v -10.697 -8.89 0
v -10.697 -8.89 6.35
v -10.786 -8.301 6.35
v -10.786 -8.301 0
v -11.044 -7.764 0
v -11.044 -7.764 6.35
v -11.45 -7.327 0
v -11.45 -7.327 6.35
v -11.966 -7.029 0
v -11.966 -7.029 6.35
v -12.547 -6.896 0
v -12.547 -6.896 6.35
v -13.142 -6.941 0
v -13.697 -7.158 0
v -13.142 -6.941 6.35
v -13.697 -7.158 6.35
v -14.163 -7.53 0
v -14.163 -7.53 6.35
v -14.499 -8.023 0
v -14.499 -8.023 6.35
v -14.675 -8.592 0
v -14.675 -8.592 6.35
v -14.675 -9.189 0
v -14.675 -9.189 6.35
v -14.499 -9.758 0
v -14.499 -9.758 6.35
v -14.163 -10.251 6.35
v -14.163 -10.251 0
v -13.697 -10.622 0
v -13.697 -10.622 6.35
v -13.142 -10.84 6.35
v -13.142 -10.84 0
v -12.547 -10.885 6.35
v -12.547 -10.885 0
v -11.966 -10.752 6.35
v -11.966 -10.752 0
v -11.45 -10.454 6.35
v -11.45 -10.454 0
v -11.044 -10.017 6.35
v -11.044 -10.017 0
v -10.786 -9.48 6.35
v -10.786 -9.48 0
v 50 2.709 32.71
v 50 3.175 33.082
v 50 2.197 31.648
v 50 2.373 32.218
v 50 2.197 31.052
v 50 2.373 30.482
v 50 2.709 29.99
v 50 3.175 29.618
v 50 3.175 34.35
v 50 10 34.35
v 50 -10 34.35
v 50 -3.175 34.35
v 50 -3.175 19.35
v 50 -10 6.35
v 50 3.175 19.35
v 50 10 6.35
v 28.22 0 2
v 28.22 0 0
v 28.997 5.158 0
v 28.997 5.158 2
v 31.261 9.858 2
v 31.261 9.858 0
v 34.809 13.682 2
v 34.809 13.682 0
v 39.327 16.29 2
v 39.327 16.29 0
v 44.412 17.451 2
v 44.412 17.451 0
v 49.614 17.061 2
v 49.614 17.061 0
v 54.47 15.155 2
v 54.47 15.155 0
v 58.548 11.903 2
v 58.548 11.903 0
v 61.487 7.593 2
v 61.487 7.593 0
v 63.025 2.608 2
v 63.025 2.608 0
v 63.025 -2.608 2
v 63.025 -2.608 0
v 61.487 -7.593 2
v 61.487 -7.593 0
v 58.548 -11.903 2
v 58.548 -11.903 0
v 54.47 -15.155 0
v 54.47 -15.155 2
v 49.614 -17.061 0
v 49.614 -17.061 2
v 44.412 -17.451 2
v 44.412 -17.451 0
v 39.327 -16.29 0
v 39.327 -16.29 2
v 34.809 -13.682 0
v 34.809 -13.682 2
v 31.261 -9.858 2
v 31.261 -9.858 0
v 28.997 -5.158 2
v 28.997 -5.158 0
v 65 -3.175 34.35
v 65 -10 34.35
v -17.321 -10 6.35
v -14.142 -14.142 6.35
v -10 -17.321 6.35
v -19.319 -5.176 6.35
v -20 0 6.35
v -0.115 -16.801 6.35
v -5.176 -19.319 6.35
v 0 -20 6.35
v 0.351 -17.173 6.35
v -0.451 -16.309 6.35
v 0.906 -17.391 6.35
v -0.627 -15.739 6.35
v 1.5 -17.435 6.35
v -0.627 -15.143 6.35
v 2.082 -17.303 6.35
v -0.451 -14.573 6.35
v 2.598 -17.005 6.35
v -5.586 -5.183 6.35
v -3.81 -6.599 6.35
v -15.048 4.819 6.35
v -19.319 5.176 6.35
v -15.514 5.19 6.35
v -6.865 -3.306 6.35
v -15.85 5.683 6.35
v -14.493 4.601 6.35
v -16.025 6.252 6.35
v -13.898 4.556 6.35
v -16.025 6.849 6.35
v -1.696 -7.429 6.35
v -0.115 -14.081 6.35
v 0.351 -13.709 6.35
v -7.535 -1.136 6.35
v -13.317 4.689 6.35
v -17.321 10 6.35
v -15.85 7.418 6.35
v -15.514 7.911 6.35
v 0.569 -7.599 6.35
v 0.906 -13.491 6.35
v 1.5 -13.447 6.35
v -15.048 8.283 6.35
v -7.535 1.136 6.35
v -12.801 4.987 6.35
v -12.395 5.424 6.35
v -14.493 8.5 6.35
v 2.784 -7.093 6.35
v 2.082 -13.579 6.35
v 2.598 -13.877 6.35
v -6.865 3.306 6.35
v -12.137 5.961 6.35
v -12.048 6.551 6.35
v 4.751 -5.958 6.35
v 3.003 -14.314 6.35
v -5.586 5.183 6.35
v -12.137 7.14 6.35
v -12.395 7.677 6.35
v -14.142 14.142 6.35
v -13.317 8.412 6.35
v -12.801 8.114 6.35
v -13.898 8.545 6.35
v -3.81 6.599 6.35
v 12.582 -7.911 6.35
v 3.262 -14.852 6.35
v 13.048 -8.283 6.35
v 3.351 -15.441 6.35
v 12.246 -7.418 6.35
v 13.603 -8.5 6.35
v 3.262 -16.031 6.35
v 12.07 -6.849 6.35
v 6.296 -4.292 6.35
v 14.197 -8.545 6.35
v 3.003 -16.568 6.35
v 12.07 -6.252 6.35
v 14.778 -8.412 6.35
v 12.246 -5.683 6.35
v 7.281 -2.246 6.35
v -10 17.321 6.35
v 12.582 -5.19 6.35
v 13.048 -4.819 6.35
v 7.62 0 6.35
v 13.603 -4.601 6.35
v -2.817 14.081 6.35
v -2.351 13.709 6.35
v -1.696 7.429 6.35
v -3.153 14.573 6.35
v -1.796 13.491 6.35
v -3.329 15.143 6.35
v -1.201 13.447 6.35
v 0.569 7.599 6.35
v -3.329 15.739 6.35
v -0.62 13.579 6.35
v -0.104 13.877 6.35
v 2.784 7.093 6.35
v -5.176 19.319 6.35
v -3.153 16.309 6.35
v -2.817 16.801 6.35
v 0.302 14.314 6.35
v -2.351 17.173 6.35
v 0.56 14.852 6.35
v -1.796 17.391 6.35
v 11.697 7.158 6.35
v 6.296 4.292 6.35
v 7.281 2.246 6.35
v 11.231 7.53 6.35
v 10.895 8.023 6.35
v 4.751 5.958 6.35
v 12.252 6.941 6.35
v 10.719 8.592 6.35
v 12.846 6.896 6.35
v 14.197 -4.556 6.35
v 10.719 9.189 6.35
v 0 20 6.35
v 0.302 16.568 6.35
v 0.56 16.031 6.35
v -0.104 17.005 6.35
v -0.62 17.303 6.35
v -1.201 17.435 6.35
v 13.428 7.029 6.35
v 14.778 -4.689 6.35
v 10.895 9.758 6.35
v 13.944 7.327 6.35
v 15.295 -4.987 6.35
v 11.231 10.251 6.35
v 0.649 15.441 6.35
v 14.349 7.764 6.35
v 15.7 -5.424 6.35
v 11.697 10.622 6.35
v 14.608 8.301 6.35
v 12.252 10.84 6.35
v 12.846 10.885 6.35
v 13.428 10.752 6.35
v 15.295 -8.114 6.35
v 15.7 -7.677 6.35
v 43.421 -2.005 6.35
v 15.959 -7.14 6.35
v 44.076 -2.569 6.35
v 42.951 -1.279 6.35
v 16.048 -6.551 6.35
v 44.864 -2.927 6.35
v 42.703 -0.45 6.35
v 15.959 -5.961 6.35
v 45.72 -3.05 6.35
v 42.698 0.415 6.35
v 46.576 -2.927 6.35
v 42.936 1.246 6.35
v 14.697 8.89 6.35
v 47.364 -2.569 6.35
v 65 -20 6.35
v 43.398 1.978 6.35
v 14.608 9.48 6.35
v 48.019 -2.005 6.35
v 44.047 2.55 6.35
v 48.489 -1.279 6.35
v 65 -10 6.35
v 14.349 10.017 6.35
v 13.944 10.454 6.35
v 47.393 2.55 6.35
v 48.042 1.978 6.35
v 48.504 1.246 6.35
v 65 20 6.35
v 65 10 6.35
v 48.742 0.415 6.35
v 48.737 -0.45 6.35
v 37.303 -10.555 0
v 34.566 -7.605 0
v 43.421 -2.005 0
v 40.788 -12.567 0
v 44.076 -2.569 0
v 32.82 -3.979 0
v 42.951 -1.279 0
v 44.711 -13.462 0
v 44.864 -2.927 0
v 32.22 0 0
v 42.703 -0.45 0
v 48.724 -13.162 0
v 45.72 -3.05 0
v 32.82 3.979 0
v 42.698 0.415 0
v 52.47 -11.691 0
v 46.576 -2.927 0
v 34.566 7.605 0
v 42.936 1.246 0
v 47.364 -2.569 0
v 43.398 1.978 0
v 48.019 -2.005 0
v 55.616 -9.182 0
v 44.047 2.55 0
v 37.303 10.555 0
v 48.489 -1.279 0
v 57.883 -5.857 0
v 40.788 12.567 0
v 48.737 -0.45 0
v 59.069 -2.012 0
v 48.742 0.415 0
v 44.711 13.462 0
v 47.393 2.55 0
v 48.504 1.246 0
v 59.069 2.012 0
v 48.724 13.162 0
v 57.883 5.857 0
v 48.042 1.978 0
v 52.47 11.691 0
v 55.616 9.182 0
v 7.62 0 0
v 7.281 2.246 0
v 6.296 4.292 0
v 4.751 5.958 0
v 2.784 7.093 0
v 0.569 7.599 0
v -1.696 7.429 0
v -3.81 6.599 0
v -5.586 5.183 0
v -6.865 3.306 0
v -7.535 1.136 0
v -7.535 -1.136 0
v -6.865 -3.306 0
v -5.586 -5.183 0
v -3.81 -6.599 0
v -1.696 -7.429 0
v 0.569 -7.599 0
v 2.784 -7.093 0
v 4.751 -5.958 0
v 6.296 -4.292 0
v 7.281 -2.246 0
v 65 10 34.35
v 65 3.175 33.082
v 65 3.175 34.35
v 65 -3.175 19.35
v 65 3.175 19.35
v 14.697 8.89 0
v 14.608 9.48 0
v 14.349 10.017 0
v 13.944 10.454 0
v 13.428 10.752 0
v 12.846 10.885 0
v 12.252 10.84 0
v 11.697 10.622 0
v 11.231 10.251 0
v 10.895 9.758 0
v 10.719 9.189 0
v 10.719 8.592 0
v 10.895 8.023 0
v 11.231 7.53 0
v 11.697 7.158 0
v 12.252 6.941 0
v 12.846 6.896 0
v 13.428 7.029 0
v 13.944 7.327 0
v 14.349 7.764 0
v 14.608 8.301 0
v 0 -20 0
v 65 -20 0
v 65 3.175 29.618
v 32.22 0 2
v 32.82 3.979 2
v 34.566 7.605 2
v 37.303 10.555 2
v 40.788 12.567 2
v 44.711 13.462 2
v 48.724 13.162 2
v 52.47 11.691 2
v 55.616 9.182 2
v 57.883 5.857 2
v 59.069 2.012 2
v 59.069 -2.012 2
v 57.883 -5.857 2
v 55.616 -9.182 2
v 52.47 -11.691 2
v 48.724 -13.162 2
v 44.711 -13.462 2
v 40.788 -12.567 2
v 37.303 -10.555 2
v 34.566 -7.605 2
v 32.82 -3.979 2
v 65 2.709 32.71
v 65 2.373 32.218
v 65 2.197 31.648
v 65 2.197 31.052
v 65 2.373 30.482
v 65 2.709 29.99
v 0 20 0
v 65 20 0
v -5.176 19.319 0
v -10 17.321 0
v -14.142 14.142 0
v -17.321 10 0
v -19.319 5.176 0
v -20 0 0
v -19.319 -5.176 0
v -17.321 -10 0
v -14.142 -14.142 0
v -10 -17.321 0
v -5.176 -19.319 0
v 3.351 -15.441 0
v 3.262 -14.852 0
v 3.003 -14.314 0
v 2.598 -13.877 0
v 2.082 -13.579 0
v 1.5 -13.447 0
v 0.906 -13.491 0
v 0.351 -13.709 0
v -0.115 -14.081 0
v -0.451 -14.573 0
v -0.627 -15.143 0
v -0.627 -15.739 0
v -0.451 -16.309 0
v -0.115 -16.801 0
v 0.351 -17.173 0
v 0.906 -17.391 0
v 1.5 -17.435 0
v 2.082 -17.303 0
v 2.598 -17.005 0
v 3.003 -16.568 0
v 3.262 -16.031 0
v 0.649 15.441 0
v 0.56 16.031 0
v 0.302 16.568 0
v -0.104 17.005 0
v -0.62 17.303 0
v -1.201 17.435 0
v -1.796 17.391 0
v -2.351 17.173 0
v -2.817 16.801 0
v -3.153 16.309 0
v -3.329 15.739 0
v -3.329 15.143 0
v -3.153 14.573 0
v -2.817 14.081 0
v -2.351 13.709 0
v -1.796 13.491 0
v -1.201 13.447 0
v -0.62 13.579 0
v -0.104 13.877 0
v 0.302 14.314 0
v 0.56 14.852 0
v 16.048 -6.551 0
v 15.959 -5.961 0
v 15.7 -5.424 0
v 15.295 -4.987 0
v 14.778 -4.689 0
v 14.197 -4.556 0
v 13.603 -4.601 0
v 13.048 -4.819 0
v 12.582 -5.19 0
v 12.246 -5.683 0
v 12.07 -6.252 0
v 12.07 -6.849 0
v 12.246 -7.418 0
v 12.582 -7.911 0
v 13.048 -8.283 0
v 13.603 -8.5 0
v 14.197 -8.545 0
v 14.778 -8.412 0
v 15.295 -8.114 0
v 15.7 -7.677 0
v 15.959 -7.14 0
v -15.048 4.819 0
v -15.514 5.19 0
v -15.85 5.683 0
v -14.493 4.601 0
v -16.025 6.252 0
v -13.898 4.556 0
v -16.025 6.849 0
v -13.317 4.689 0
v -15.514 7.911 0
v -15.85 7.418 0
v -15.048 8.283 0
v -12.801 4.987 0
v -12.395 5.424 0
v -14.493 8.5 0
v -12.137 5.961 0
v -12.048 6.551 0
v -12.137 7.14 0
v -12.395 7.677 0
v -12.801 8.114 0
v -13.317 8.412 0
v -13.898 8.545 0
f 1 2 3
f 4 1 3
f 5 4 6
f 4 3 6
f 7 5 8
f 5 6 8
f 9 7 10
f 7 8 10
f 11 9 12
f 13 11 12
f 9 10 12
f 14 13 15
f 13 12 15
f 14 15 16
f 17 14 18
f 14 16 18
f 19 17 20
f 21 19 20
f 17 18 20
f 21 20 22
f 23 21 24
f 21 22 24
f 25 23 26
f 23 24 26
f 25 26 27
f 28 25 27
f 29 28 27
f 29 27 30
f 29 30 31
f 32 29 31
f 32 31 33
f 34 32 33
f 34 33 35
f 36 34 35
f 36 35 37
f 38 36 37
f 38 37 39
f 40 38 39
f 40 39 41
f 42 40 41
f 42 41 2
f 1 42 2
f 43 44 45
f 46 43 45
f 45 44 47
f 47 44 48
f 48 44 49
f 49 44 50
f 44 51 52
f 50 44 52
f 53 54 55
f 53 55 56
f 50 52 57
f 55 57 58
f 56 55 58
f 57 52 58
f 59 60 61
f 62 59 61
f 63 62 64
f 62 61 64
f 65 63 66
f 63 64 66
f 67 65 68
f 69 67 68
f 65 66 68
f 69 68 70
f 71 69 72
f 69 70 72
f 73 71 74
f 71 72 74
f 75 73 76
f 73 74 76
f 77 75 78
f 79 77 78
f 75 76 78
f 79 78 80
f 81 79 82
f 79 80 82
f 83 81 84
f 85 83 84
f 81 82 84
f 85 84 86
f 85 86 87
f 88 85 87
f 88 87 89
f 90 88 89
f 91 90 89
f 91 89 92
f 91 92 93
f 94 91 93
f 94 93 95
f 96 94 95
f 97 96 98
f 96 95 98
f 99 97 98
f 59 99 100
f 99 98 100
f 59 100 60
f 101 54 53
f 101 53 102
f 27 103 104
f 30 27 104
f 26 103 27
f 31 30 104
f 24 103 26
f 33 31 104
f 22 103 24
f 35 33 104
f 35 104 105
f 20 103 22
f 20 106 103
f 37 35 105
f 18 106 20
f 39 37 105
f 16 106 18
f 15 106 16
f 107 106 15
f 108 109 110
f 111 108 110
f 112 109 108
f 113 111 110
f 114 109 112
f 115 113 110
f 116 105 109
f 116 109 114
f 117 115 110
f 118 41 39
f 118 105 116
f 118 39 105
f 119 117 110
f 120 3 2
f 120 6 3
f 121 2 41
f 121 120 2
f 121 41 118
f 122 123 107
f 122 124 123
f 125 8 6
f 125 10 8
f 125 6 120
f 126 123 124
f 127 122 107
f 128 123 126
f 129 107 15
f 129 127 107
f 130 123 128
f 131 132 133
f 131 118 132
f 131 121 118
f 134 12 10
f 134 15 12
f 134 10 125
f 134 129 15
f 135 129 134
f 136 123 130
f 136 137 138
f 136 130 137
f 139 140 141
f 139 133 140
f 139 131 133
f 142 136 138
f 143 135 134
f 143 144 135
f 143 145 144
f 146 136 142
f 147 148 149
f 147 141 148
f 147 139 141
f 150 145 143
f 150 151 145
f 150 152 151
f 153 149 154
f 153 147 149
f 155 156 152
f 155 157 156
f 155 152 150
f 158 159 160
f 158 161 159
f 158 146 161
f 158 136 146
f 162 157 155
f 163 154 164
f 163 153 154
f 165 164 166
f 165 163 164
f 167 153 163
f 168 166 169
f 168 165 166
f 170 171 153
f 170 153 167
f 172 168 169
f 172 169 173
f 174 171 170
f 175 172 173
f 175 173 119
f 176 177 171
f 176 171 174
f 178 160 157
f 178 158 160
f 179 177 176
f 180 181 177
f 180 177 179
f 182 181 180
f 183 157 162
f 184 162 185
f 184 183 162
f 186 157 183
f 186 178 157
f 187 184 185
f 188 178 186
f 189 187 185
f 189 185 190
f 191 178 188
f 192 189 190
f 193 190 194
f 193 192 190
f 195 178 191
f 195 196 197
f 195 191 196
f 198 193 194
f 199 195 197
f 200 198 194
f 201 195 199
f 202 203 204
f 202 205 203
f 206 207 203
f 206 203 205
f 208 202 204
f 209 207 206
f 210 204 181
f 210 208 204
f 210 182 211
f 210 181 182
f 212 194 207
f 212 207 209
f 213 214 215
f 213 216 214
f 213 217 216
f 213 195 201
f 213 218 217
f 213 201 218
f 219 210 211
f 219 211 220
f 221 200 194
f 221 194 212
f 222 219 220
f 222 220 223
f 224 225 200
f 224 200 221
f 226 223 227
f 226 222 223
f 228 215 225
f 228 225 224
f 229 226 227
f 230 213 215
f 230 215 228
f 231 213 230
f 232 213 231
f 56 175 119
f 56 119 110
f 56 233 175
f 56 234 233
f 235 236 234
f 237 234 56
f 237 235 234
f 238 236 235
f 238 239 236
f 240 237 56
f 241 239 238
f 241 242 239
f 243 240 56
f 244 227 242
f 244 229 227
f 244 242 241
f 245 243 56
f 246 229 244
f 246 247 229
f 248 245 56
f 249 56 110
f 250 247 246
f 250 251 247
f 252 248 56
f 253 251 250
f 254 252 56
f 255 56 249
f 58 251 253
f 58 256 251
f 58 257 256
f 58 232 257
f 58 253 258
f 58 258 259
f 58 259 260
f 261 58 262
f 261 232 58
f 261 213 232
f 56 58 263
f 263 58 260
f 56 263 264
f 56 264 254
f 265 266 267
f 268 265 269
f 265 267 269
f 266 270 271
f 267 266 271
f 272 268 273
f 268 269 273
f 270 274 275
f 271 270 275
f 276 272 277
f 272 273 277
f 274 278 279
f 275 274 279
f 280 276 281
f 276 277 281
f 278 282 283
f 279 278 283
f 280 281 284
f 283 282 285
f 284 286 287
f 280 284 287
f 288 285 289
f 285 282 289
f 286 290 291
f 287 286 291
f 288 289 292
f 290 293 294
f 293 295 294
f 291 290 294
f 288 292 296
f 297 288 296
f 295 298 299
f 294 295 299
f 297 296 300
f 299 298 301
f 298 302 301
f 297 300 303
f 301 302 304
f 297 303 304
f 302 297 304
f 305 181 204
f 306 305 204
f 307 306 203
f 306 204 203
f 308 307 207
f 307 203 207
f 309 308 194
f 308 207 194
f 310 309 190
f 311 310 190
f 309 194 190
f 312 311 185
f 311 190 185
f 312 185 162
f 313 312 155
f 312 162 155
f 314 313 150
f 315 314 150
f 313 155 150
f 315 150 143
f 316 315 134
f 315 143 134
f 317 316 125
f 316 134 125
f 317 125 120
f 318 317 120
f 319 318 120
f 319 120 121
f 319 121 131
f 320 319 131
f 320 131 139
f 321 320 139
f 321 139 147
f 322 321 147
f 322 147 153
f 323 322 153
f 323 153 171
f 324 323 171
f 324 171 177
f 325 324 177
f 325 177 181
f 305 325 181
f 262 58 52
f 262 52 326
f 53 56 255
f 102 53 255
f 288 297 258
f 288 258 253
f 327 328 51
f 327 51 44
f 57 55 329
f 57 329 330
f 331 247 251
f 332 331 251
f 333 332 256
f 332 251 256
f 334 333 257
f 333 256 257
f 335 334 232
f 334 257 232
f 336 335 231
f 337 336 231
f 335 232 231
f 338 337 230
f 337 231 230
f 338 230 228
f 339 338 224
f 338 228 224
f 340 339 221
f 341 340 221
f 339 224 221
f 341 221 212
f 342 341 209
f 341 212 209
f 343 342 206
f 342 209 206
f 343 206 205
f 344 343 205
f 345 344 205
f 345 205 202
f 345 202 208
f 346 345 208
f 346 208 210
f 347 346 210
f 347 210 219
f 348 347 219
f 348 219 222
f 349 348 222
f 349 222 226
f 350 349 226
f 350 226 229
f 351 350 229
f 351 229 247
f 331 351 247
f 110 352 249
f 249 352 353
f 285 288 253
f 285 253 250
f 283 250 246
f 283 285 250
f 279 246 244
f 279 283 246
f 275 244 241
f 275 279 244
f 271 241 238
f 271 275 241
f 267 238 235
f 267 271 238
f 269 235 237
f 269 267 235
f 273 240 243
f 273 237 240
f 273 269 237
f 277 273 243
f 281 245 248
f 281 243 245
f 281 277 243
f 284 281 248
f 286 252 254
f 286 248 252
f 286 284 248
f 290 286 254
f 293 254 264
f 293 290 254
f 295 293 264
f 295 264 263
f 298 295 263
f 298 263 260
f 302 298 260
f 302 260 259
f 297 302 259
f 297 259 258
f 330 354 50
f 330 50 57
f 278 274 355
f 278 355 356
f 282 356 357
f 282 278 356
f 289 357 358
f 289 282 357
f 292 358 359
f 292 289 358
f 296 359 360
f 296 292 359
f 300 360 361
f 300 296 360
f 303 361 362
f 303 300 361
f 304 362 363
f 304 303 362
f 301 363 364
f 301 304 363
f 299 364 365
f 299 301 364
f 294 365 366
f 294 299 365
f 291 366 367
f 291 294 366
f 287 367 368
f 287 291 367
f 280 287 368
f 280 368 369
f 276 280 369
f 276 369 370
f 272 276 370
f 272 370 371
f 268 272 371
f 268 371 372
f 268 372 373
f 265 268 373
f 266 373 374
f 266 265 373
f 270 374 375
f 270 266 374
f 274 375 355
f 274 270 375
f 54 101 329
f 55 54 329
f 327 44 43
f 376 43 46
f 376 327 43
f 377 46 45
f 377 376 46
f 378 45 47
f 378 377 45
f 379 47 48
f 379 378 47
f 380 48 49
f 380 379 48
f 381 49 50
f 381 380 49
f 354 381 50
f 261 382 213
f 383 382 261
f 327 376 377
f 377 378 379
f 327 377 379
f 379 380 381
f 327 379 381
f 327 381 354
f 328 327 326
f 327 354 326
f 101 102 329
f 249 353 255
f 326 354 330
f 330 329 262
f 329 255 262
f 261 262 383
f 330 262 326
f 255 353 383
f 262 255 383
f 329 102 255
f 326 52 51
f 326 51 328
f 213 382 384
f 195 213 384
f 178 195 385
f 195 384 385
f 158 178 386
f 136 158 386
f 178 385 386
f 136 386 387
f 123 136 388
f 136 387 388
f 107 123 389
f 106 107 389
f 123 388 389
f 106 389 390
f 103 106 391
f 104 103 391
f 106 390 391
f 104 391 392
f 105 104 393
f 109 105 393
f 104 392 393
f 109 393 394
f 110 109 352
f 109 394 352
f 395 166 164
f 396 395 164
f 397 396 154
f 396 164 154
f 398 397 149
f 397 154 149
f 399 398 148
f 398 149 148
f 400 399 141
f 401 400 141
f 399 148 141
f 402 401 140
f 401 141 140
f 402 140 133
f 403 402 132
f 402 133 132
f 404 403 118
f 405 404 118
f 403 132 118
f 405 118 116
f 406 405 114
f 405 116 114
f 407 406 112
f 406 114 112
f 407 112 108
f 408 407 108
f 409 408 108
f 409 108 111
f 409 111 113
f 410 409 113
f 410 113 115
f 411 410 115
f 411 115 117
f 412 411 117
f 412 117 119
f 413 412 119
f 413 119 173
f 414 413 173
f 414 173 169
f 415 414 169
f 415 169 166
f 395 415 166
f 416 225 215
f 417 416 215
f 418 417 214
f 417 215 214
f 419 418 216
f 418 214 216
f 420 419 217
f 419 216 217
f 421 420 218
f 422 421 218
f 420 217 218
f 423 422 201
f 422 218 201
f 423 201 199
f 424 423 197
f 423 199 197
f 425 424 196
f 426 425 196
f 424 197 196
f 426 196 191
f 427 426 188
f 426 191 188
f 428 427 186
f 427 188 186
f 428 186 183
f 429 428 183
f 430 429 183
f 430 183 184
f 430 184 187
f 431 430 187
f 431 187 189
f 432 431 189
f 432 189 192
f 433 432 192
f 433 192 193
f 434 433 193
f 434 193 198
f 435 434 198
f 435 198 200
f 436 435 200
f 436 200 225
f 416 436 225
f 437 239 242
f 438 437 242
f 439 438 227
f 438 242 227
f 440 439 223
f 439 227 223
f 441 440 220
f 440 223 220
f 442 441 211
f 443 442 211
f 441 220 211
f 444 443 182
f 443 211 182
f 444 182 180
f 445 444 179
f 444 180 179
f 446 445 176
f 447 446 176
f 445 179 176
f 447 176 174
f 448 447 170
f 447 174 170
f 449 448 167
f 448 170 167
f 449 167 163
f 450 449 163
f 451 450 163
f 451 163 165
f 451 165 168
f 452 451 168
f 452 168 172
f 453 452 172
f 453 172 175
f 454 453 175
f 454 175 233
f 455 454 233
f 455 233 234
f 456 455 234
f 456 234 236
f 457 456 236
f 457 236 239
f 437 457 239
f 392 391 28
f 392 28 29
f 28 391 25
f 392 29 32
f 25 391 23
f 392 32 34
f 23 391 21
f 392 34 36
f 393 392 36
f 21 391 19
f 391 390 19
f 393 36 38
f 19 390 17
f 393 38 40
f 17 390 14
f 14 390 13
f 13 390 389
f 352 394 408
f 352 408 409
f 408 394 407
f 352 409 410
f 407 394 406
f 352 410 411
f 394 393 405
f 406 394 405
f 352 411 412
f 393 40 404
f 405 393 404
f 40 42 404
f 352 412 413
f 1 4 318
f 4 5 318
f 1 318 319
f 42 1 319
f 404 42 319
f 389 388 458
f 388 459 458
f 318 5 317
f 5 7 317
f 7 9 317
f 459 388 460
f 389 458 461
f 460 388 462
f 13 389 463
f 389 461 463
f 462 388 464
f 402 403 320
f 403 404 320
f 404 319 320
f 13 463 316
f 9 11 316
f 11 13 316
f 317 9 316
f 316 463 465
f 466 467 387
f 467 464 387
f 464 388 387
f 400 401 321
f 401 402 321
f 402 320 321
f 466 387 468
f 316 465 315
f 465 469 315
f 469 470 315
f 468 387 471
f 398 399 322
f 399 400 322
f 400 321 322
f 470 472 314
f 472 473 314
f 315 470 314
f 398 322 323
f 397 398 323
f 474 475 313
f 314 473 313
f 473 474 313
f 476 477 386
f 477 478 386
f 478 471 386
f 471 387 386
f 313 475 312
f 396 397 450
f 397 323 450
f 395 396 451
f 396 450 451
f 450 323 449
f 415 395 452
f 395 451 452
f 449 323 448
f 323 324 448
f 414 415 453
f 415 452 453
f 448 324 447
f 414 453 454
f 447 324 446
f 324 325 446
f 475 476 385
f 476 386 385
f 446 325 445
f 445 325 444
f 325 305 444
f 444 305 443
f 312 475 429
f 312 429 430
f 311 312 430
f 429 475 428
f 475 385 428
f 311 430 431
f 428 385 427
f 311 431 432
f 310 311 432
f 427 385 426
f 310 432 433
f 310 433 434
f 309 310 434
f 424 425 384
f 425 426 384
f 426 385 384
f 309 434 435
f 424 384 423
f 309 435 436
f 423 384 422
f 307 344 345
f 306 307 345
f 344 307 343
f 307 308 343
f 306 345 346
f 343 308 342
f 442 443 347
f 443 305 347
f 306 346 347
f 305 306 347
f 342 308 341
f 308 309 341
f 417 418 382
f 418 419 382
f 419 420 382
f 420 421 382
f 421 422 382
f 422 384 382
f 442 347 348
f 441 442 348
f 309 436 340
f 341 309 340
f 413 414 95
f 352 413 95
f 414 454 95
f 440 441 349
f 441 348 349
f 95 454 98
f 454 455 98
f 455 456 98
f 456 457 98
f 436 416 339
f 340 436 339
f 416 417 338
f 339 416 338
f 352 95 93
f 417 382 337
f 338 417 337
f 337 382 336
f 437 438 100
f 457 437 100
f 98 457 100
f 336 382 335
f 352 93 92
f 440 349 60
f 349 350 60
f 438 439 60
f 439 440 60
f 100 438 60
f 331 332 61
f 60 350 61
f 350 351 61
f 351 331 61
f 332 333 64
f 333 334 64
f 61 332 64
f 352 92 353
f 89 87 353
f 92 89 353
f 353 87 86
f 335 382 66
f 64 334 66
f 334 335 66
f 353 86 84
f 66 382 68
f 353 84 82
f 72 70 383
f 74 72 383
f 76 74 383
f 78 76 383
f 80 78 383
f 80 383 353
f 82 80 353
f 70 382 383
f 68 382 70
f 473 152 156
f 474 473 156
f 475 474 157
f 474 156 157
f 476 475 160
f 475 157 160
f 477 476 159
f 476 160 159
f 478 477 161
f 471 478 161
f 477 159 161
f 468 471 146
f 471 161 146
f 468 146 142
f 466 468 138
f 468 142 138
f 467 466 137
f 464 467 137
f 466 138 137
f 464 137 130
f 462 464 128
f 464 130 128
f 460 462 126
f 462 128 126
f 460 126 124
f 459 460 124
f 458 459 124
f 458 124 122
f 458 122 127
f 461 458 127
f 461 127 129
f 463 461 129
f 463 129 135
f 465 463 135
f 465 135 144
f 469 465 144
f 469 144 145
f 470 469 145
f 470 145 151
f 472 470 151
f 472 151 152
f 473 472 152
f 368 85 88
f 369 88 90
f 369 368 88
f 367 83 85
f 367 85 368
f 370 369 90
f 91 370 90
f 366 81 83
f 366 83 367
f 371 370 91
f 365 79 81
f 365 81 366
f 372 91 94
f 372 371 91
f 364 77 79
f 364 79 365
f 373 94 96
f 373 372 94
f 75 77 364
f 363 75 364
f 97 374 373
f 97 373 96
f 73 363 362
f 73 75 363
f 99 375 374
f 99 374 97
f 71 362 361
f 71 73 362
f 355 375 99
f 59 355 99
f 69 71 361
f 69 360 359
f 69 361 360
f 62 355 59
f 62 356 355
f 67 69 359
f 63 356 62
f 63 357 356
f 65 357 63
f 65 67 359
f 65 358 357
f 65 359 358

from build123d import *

# Parameters (mm, degrees)
SKETCH1_R           = 20
SKETCH1_W           = 65
SKETCH1_H           = 40
BOSS_EXTRUDE1_DEPTH = 6.35
SKETCH2_R           = 7.62
SKETCH2_R_2         = 2
CUT_EXTRUDE1_DEPTH  = 69.303166105
SKETCH4_W           = 15
SKETCH4_H           = 28
BOSS_EXTRUDE2_DEPTH = 10
CUT_EXTRUDE2_REACH  = 95.835
SKETCH5_W           = 15
SKETCH5_H           = 6.35
CUT_EXTRUDE3_REACH  = 78.19
SKETCH7_R           = 17.5
SKETCH7_R_2         = 13.5
CUT_EXTRUDE4_DEPTH  = 2
SKETCH8_R           = 2
BOSS_EXTRUDE3_DEPTH = 15


with BuildPart() as part:
    # Sketch1 → Boss-Extrude1 (new body)
    with BuildSketch(Plane.XY):
        Circle(SKETCH1_R)
        with Locations((32.5, 0)):
            Rectangle(SKETCH1_W, SKETCH1_H)
    extrude(amount=BOSS_EXTRUDE1_DEPTH)

    # Sketch2 → Cut-Extrude1 (cut, through all)
    with BuildSketch(Plane.XY.offset(6.35)):
        Circle(SKETCH2_R)
        with Locations((-1.350914013, 15.44101782)):
            Circle(SKETCH2_R_2)
        with Locations((12.696856686, 8.890434763)):
            Circle(SKETCH2_R_2)
        with Locations((14.047770699, -6.550583057)):
            Circle(SKETCH2_R_2)
        with Locations((1.350914013, -15.44101782)):
            Circle(SKETCH2_R_2)
        with Locations((-12.696856686, -8.890434763)):
            Circle(SKETCH2_R_2)
        with Locations((-14.047770699, 6.550583057)):
            Circle(SKETCH2_R_2)
    extrude(amount=-CUT_EXTRUDE1_DEPTH, mode=Mode.SUBTRACT)

    # Sketch4 → Boss-Extrude2 (add, symmetric)
    with BuildSketch(Plane(origin=(0, 0, 0), x_dir=(1, 0, 0), z_dir=(0, 1, 0))):
        with Locations((57.5, -20.35)):
            Rectangle(SKETCH4_W, SKETCH4_H)
    extrude(amount=BOSS_EXTRUDE2_DEPTH, both=True)

    # Sketch5 → Cut-Extrude2 (cut, up to next)
    with BuildSketch(Plane(origin=(65, 0, 0), x_dir=(0, 0, -1), z_dir=(1, 0, 0)), mode=Mode.PRIVATE) as cut_extrude2_sk1:
        with Locations((-26.85, 0)):
            Rectangle(SKETCH5_W, SKETCH5_H)
    cut_extrude2_tool1 = extrude(cut_extrude2_sk1.sketch, amount=-CUT_EXTRUDE2_REACH, mode=Mode.PRIVATE) & part.part
    add(cut_extrude2_tool1.solids().sort_by_distance((65, 0, 26.85))[0], mode=Mode.SUBTRACT)

    # Sketch6 → Cut-Extrude3 (cut, up to next)
    with BuildSketch(Plane(origin=(0, 0, 0), x_dir=(-1, 0, 0), z_dir=(0, 0, -1)), mode=Mode.PRIVATE) as cut_extrude3_sk1:
        with BuildLine():
            Line((-47.393320053, 2.55), (-44.046679947, 2.55))
            ThreePointArc((-44.046679947, 2.55), (-45.72, -3.05), (-47.393320053, 2.55))
        make_face()
    cut_extrude3_tool1 = extrude(cut_extrude3_sk1.sketch, amount=-CUT_EXTRUDE3_REACH, mode=Mode.PRIVATE) & part.part
    add(cut_extrude3_tool1.solids().sort_by_distance((45.72, -0.111199, 0))[0], mode=Mode.SUBTRACT)

    # Sketch7 → Cut-Extrude4 (cut)
    with BuildSketch(Plane(origin=(0, 0, 0), x_dir=(-1, 0, 0), z_dir=(0, 0, -1))):
        with Locations((-45.72, 0)):
            Circle(SKETCH7_R)
        with Locations((-45.72, 0)):
            Circle(SKETCH7_R_2, mode=Mode.SUBTRACT)
    extrude(amount=-CUT_EXTRUDE4_DEPTH, mode=Mode.SUBTRACT)

    # Sketch8 → Boss-Extrude3 (add)
    with BuildSketch(Plane(origin=(65, 0, 0), x_dir=(0, 0, -1), z_dir=(1, 0, 0))):
        with Locations((-31.35, 4.175)):
            Circle(SKETCH8_R)
    extrude(amount=-BOSS_EXTRUDE3_DEPTH)


solid = part.part
